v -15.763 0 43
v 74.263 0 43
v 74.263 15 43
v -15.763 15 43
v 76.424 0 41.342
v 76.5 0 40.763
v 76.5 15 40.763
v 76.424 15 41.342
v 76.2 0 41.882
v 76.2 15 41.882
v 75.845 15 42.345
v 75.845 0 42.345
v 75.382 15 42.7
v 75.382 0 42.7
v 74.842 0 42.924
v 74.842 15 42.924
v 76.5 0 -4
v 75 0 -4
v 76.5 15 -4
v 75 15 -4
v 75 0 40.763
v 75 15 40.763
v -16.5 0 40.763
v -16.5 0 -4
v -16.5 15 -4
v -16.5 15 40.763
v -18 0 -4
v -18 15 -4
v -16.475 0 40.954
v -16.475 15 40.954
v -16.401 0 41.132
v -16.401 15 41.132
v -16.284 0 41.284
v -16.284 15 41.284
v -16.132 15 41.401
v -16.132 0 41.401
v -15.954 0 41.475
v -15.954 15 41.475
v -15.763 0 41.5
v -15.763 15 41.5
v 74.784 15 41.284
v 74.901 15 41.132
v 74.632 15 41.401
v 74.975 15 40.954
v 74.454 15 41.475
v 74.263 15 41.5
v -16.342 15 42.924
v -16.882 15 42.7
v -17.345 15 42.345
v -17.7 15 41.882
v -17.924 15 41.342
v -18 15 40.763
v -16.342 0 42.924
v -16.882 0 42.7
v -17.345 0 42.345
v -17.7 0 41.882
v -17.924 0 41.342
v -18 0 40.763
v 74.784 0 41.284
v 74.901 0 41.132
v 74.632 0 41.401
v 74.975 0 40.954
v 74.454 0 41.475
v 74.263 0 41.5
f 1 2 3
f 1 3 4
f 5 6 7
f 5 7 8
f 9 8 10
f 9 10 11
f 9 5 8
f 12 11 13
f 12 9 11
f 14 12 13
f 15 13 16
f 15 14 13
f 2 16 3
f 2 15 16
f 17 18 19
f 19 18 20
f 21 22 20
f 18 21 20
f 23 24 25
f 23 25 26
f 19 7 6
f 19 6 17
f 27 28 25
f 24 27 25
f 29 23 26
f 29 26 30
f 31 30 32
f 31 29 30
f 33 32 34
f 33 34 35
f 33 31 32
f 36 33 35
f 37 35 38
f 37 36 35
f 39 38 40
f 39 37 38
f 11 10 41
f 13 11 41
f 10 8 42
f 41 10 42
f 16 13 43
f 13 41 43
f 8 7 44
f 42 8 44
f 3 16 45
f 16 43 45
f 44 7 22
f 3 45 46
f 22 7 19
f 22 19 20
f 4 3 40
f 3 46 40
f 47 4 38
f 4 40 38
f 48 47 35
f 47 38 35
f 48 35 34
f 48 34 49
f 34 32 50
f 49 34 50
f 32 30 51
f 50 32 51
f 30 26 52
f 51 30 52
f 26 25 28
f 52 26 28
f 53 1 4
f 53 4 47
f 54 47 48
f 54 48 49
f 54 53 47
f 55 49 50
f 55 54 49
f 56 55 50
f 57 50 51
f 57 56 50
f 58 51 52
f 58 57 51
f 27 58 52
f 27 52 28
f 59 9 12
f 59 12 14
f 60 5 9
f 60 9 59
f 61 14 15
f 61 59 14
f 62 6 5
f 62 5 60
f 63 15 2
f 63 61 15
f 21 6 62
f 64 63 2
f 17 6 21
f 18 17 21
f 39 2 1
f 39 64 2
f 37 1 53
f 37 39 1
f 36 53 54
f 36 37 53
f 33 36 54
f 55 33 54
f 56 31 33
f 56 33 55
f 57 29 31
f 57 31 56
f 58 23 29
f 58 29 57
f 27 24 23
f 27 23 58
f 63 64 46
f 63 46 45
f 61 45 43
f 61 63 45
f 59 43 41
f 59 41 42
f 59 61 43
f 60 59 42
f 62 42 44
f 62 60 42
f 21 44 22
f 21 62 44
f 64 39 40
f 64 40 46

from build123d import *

# Parameters (mm, degrees)
BASE_FLANGE1_DEPTH           = 1.5
EDGE_FLANGE1_STRIP_W         = 7.4732
EDGE_FLANGE1_STRIP_H         = 1.5
EDGE_FLANGE1_STRIP_CUT_DEPTH = 15
EDGE_FLANGE1_DEPTH           = 15
EDGE_FLANGE2_STRIP_W         = 7.4732
EDGE_FLANGE2_STRIP_H         = 1.5
EDGE_FLANGE2_STRIP_CUT_DEPTH = 15
EDGE_FLANGE2_DEPTH           = 15


# Sheet-metal steps are written as plain solids
with BuildPart() as part:
    # Sketch3 → Base-Flange1 (new body)
    with BuildSketch(Plane.ZY.offset(-75)):
        Polygon((0, 15), (41.5, 15), (41.5, 0), (0, 0), (-4, 0), (-4, 15), align=None)
    extrude(amount=-BASE_FLANGE1_DEPTH)

    # Edge-Flange1 strip (across the edge) → Edge-Flange1 strip cut (cut)
    with BuildSketch(Plane(origin=(75, 0, 41.5), x_dir=(0, 0, -1), z_dir=(0, 1, 0))):
        with Locations((-3, -0.75)):
            Rectangle(EDGE_FLANGE1_STRIP_W, EDGE_FLANGE1_STRIP_H)
    extrude(amount=EDGE_FLANGE1_STRIP_CUT_DEPTH, mode=Mode.SUBTRACT)

    # Edge-Flange1 section (across the edge) → Edge-Flange1 (add)
    with BuildSketch(Plane(origin=(75, 0, 41.5), x_dir=(0, 0, -1), z_dir=(0, 1, 0))):
        with BuildLine():
            Line((-1.5, 0.7366), (-1.5, 91.5))
            Line((-1.5, 91.5), (0, 91.5))
            Line((0, 91.5), (0, 0.7366))
            ThreePointArc((0, 0.7366), (0.215745145, 0.215745145), (0.7366, 0))
            Line((0.7366, 0), (0.7366, -1.5))
            ThreePointArc((0.7366, -1.5), (-0.844915027, -0.844915027), (-1.5, 0.7366))
        make_face()
    extrude(amount=EDGE_FLANGE1_DEPTH)

    # Edge-Flange2 strip (across the edge) → Edge-Flange2 strip cut (cut)
    with BuildSketch(Plane(origin=(-16.5, 0, 41.5), x_dir=(1, 0, 0), z_dir=(0, 1, 0))):
        with Locations((-3, -0.75)):
            Rectangle(EDGE_FLANGE2_STRIP_W, EDGE_FLANGE2_STRIP_H)
    extrude(amount=EDGE_FLANGE2_STRIP_CUT_DEPTH, mode=Mode.SUBTRACT)

    # Edge-Flange2 section (across the edge) → Edge-Flange2 (add)
    with BuildSketch(Plane(origin=(-16.5, 0, 41.5), x_dir=(1, 0, 0), z_dir=(0, 1, 0))):
        with BuildLine():
            Line((-1.5, 0.7366), (-1.5, 45.5))
            Line((-1.5, 45.5), (0, 45.5))
            Line((0, 45.5), (0, 0.7366))
            ThreePointArc((0, 0.7366), (0.215745145, 0.215745145), (0.7366, 0))
            Line((0.7366, 0), (0.7366, -1.5))
            ThreePointArc((0.7366, -1.5), (-0.844915027, -0.844915027), (-1.5, 0.7366))
        make_face()
    extrude(amount=EDGE_FLANGE2_DEPTH)


solid = part.part
